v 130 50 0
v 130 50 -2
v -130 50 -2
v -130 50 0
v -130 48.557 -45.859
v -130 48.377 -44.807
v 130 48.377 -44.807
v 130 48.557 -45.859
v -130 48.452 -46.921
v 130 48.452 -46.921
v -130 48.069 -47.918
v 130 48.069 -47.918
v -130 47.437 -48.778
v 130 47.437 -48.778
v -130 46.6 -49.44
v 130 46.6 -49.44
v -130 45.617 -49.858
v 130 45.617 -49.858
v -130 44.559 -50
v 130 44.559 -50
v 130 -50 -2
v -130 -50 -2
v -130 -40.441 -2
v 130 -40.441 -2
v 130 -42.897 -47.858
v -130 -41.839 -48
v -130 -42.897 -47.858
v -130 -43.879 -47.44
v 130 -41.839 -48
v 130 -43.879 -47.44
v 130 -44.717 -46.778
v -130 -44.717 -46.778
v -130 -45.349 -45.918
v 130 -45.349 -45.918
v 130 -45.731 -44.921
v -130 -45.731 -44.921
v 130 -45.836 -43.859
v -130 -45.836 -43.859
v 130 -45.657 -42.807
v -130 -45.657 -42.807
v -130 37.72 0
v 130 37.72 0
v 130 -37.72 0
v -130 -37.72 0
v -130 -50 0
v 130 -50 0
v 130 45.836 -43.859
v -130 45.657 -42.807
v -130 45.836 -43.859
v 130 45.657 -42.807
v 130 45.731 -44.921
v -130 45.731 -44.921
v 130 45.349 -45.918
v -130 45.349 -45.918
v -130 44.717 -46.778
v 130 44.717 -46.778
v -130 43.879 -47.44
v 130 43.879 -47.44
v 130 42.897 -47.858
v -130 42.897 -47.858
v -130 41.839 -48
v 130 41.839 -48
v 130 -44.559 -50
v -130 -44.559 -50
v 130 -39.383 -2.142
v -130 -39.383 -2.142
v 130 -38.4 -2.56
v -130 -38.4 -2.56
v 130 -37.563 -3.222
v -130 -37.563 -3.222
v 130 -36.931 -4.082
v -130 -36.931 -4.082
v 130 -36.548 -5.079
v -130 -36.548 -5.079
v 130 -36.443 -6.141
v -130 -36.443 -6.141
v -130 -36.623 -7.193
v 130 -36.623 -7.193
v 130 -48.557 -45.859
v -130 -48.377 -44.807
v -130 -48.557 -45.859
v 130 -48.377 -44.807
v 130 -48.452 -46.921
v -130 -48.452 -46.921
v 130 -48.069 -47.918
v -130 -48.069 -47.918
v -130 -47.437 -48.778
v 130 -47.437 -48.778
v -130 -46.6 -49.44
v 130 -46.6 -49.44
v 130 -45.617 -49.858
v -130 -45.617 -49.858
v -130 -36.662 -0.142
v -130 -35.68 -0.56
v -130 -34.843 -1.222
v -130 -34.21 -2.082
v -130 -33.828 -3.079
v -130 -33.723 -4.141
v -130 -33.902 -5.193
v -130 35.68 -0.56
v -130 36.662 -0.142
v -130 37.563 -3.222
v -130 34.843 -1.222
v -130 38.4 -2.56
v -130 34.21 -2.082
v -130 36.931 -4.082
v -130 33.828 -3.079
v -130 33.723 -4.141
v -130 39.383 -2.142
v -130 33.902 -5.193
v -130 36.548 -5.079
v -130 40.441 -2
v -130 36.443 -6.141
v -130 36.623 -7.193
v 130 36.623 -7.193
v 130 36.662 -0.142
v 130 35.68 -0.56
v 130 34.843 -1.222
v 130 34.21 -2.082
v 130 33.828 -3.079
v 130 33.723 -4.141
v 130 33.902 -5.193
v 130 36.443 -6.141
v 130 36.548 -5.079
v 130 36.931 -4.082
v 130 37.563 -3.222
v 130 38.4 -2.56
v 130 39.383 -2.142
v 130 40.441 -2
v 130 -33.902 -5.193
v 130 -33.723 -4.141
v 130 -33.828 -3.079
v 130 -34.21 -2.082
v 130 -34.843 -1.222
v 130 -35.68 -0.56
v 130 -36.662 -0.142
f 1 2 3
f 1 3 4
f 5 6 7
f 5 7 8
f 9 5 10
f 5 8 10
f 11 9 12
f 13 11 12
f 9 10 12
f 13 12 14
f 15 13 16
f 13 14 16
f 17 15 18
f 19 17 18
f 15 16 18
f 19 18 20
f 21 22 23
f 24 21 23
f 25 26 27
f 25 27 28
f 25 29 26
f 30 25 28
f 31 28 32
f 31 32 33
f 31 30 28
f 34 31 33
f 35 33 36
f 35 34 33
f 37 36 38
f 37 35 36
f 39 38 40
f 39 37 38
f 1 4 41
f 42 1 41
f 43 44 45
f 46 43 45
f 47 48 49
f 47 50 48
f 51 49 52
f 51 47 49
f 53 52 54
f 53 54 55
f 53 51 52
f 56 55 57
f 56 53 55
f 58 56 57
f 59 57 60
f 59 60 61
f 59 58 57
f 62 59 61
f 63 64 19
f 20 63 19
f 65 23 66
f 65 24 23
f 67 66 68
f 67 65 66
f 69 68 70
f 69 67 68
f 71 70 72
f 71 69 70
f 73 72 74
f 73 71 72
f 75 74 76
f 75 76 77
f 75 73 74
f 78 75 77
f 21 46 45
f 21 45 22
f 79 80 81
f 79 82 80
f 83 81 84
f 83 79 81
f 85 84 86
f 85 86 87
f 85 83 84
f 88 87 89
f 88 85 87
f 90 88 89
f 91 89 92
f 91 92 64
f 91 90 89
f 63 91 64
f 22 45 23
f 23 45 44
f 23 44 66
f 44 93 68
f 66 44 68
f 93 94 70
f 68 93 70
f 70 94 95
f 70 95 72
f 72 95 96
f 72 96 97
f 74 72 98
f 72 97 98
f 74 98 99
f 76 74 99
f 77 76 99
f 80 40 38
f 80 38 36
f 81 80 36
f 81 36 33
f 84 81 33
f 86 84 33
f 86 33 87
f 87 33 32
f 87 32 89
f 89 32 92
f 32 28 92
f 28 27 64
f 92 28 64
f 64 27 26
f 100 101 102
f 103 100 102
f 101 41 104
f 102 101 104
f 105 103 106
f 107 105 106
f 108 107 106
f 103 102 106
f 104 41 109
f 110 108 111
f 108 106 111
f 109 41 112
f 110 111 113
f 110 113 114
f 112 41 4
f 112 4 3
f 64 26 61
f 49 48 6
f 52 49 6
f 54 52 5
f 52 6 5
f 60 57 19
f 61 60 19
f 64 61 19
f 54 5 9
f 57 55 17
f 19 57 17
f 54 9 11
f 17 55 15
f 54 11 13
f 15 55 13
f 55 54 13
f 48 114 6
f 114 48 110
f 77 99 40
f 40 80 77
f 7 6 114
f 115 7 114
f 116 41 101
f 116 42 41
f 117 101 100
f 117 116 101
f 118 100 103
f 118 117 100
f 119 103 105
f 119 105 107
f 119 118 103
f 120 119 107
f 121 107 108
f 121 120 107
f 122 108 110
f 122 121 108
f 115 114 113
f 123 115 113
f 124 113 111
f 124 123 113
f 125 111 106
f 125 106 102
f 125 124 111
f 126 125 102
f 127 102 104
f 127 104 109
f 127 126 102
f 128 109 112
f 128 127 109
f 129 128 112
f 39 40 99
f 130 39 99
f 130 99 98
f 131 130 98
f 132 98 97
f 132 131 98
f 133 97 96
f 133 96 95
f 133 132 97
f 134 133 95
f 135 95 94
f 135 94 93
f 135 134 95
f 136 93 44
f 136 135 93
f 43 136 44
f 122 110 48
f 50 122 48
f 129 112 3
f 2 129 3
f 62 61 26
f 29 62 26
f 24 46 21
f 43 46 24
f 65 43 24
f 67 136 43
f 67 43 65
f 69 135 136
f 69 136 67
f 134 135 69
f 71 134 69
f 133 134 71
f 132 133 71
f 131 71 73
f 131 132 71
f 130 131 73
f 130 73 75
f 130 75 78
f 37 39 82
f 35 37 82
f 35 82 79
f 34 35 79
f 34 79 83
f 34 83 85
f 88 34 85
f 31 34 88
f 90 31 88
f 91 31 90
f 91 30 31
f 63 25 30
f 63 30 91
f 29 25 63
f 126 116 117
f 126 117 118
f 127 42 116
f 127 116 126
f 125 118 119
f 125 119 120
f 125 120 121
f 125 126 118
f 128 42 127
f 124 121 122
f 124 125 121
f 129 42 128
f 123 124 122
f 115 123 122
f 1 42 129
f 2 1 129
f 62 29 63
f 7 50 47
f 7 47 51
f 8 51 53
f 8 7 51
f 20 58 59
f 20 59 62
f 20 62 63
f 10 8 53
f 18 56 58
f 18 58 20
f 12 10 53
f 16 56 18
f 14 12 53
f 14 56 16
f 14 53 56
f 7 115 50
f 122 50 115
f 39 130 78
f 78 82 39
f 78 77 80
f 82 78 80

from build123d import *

# Parameters (mm, degrees)
SALIENTE_EXTRUIR1_DEPTH      = 130
SALIENTE_EXTRUIR1_DEPTH_BACK = 130
REDONDEO1_R                  = 4


with BuildPart() as part:
    # Croquis1 → Saliente-Extruir1 (new, two sides: drawn at the far end of the back side and taken through both)
    with BuildSketch(Plane(origin=(0, 0, 0), x_dir=(0, 0, -1), z_dir=(1, 0, 0)).offset(-SALIENTE_EXTRUIR1_DEPTH_BACK)):
        Polygon((50, 50), (2, 35), (2, 50), (0, 50), (0, 32.279618173), (48, 47.279618173), (48, 0), (48, -47.279618173), (0, -32.279618173), (0, -50), (2, -50), (2, -35), (50, -50), (50, 0), align=None)
    extrude(amount=SALIENTE_EXTRUIR1_DEPTH + SALIENTE_EXTRUIR1_DEPTH_BACK)

    # Redondeo1
    redondeo1_edges = [part.edges().sort_by_distance(p)[0] for p in [
        (0, -50, -50),
        (0, -35, -2),
        (0, -32.279618173, 0),
        (0, -47.279618173, -48),
        (0, 47.279618173, -48),
        (0, 32.279618173, 0),
        (0, 35, -2),
        (0, 50, -50),
    ]]
    fillet(redondeo1_edges, radius=REDONDEO1_R)


solid = part.part
